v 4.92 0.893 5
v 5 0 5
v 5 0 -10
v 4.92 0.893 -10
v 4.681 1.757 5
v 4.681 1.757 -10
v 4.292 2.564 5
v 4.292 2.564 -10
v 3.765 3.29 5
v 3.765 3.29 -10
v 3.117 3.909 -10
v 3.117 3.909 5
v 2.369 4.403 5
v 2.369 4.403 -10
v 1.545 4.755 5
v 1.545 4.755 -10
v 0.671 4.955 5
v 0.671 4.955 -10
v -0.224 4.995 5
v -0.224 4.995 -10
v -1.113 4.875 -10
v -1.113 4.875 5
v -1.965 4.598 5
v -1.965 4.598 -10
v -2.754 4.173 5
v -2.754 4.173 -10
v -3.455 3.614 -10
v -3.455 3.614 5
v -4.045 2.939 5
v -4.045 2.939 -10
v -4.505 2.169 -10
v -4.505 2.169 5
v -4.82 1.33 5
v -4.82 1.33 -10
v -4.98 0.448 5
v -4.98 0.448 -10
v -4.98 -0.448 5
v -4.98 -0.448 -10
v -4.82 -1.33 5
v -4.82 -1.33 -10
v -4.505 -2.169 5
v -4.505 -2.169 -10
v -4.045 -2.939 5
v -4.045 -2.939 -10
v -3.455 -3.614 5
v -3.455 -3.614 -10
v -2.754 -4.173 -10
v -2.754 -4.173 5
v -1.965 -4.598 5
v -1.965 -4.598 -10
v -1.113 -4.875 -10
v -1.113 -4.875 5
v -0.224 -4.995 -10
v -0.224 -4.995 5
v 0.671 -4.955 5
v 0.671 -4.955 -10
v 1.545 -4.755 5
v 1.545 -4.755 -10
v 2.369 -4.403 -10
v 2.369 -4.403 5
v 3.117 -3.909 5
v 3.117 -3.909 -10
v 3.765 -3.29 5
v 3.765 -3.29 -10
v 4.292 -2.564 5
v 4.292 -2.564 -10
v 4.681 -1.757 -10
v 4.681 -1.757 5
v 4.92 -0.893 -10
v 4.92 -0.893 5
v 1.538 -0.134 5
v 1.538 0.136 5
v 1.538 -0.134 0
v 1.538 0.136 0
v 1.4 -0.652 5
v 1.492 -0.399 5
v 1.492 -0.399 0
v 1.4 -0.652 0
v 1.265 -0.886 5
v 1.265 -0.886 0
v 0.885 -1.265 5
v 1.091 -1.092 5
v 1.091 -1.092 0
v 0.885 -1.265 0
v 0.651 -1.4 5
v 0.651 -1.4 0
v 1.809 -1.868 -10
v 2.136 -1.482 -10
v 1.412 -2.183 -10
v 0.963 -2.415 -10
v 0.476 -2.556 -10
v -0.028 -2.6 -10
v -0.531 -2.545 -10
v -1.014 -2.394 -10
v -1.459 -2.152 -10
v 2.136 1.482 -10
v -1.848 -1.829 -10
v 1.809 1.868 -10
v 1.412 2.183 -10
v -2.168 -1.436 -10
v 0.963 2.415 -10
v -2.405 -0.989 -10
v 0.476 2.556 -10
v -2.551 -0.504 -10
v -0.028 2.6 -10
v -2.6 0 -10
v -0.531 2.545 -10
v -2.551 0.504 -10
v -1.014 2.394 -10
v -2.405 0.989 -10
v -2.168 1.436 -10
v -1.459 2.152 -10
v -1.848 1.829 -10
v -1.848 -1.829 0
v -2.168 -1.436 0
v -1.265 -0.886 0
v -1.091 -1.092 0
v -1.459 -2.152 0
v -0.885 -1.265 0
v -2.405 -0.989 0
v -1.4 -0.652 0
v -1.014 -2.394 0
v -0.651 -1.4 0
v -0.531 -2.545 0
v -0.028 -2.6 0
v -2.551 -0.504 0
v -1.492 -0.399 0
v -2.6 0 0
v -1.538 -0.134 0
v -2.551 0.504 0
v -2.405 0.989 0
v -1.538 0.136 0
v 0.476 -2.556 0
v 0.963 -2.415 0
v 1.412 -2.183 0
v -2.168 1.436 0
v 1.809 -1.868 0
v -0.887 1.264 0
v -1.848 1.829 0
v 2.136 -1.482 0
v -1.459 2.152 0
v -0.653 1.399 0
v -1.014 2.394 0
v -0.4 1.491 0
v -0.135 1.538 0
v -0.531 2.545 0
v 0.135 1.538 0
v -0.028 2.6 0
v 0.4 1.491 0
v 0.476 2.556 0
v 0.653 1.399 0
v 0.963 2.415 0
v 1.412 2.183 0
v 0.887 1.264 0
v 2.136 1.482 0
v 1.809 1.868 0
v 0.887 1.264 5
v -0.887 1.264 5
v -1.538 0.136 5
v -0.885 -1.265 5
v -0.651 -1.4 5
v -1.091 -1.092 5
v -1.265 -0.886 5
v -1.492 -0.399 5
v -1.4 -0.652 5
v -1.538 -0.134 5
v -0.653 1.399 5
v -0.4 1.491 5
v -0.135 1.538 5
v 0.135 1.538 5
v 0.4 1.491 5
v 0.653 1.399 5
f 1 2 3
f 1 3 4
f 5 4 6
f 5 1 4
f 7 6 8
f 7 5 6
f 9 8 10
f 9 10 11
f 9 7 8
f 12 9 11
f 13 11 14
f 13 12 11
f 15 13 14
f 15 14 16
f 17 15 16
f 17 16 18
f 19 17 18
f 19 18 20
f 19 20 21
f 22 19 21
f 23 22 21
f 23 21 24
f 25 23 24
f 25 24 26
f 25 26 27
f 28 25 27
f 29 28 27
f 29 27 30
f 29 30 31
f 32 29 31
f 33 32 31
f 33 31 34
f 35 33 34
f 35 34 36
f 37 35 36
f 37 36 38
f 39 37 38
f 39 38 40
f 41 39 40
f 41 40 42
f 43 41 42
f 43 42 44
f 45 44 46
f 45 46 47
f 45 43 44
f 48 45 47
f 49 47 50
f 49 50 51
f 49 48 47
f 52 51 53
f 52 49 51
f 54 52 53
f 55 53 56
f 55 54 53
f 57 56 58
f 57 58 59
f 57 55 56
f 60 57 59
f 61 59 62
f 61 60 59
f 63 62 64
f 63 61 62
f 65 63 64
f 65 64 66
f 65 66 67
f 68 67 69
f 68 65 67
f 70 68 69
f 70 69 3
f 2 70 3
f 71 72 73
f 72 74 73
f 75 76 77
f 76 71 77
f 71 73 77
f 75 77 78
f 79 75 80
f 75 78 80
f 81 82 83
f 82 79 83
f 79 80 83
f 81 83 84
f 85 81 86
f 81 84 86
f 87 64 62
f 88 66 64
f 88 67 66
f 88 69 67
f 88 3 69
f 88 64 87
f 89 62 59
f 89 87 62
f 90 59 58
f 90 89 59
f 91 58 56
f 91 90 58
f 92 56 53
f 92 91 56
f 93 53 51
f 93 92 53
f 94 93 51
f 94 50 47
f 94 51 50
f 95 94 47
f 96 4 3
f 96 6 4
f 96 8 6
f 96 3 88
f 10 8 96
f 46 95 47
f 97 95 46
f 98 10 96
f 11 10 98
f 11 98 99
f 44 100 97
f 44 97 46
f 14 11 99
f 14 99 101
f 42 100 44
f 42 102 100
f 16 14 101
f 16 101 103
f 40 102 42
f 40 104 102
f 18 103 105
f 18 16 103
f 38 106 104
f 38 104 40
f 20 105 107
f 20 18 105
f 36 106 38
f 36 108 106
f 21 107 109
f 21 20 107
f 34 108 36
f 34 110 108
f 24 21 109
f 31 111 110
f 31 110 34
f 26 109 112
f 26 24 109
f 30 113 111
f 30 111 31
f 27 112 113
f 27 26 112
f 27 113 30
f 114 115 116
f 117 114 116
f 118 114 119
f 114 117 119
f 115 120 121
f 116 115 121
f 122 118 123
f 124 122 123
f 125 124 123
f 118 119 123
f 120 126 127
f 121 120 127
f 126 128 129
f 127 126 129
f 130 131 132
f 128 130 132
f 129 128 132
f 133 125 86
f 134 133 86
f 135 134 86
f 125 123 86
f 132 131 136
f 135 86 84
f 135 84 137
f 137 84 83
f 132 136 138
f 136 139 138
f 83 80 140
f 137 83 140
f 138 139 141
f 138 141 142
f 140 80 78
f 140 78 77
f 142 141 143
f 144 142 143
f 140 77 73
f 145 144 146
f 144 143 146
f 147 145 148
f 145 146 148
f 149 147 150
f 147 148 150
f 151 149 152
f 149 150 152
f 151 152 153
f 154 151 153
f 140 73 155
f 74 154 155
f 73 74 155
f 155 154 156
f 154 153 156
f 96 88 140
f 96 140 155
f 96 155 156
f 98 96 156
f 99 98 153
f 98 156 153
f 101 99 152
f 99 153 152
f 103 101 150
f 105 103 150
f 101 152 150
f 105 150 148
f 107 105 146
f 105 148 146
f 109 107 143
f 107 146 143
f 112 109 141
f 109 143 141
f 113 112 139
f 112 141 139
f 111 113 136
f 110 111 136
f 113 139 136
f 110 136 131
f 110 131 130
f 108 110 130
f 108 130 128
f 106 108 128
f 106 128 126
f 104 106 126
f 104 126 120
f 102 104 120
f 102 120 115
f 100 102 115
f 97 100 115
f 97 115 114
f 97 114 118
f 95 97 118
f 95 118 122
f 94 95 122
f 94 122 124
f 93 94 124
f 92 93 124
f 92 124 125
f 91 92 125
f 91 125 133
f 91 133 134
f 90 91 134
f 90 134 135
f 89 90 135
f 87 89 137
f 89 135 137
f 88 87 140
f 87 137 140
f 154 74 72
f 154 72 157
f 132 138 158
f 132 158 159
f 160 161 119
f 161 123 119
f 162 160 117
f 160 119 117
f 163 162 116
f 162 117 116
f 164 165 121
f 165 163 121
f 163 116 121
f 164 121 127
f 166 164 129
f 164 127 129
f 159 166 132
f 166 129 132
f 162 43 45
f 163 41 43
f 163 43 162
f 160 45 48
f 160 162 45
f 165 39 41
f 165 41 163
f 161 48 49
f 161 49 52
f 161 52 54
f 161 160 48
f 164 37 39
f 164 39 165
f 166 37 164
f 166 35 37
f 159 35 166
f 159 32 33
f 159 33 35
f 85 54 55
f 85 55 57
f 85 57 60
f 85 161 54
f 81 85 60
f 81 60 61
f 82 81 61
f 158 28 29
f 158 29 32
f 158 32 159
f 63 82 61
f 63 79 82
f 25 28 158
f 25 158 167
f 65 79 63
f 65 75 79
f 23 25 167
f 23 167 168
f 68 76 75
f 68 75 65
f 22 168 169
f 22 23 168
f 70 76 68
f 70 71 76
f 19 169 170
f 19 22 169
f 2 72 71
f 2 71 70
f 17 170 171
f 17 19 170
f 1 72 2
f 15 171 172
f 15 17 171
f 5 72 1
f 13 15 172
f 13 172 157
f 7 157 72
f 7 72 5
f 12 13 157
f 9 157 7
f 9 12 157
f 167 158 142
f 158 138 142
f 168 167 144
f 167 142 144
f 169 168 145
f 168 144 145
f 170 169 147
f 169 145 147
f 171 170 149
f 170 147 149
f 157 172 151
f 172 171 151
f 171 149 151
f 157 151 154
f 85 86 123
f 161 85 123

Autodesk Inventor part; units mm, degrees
ref_plane "YZ Plane" through (0, 0, 0) normal (1, 0, 0) x (0, 1, 0)
ref_plane "XZ Plane" through (0, 0, 0) normal (0, 1, 0) x (-1, 0, 0)
ref_plane "XY Plane" through (0, 0, 0) normal (0, 0, 1) x (1, 0, 0)
sketch "Sketch1" plane through (0, 0, 0) normal (0, 0, 1) x (1, 0, 0)
  circle A0 centre (0, 0) radius 2.5 projected
  circle A1 centre (0, 0) radius 2.6
  line L0 (-1.3981, 2.1921) -> (1.3981, 2.1921)
  circle A2 centre (0, 0) radius 5
  dimension "d0" = 0.1
  dimension "d1" = 10
extrude "Extrusion1" add sketch "Sketch1" against normal blind 10
sketch "Sketch2" plane through (0, 0, 0) normal (0, 0, 1) x (1, 0, 0)
  circle A0 centre (0, 0) radius 1.4 construction
  line L0 (0.6514, -1.4) -> (-0.6514, -1.4)
  line L1 (1.5381, 0.1359) -> (0.8867, 1.2641)
  line L2 (-0.8867, 1.2641) -> (-1.5381, 0.1359)
  arc A1 (0.6514, -1.4) -> (1.5381, 0.1359) centre (0, 0) ccw
  arc A2 (-1.5381, 0.1359) -> (-0.6514, -1.4) centre (0, 0) ccw
  arc A3 (0.8867, 1.2641) -> (-0.8867, 1.2641) centre (0, 0) ccw
  circle A4 centre (0, 0) radius 5 projected
  dimension "d4" = 2.8
  dimension "d9" = 60
  dimension "d10" = 60
extrude "Extrusion2" add sketch "Sketch2" along normal blind 5
sketch "Sketch3" plane through (0, 0, -10) normal (0, 0, -1) x (-1, 0, 0)
  line L0 (-2.1363, -1.482) -> (-2.1363, 1.482)
  circle A0 centre (0, 0) radius 2.6 projected
extrude "Extrusion3" add sketch "Sketch3" against normal up to surface (10 mm away) contours A0 L0 picked at (-2.2341, 0.3085)
properties part number "OPENTRONS_Autofocus_clutch_Nema"
